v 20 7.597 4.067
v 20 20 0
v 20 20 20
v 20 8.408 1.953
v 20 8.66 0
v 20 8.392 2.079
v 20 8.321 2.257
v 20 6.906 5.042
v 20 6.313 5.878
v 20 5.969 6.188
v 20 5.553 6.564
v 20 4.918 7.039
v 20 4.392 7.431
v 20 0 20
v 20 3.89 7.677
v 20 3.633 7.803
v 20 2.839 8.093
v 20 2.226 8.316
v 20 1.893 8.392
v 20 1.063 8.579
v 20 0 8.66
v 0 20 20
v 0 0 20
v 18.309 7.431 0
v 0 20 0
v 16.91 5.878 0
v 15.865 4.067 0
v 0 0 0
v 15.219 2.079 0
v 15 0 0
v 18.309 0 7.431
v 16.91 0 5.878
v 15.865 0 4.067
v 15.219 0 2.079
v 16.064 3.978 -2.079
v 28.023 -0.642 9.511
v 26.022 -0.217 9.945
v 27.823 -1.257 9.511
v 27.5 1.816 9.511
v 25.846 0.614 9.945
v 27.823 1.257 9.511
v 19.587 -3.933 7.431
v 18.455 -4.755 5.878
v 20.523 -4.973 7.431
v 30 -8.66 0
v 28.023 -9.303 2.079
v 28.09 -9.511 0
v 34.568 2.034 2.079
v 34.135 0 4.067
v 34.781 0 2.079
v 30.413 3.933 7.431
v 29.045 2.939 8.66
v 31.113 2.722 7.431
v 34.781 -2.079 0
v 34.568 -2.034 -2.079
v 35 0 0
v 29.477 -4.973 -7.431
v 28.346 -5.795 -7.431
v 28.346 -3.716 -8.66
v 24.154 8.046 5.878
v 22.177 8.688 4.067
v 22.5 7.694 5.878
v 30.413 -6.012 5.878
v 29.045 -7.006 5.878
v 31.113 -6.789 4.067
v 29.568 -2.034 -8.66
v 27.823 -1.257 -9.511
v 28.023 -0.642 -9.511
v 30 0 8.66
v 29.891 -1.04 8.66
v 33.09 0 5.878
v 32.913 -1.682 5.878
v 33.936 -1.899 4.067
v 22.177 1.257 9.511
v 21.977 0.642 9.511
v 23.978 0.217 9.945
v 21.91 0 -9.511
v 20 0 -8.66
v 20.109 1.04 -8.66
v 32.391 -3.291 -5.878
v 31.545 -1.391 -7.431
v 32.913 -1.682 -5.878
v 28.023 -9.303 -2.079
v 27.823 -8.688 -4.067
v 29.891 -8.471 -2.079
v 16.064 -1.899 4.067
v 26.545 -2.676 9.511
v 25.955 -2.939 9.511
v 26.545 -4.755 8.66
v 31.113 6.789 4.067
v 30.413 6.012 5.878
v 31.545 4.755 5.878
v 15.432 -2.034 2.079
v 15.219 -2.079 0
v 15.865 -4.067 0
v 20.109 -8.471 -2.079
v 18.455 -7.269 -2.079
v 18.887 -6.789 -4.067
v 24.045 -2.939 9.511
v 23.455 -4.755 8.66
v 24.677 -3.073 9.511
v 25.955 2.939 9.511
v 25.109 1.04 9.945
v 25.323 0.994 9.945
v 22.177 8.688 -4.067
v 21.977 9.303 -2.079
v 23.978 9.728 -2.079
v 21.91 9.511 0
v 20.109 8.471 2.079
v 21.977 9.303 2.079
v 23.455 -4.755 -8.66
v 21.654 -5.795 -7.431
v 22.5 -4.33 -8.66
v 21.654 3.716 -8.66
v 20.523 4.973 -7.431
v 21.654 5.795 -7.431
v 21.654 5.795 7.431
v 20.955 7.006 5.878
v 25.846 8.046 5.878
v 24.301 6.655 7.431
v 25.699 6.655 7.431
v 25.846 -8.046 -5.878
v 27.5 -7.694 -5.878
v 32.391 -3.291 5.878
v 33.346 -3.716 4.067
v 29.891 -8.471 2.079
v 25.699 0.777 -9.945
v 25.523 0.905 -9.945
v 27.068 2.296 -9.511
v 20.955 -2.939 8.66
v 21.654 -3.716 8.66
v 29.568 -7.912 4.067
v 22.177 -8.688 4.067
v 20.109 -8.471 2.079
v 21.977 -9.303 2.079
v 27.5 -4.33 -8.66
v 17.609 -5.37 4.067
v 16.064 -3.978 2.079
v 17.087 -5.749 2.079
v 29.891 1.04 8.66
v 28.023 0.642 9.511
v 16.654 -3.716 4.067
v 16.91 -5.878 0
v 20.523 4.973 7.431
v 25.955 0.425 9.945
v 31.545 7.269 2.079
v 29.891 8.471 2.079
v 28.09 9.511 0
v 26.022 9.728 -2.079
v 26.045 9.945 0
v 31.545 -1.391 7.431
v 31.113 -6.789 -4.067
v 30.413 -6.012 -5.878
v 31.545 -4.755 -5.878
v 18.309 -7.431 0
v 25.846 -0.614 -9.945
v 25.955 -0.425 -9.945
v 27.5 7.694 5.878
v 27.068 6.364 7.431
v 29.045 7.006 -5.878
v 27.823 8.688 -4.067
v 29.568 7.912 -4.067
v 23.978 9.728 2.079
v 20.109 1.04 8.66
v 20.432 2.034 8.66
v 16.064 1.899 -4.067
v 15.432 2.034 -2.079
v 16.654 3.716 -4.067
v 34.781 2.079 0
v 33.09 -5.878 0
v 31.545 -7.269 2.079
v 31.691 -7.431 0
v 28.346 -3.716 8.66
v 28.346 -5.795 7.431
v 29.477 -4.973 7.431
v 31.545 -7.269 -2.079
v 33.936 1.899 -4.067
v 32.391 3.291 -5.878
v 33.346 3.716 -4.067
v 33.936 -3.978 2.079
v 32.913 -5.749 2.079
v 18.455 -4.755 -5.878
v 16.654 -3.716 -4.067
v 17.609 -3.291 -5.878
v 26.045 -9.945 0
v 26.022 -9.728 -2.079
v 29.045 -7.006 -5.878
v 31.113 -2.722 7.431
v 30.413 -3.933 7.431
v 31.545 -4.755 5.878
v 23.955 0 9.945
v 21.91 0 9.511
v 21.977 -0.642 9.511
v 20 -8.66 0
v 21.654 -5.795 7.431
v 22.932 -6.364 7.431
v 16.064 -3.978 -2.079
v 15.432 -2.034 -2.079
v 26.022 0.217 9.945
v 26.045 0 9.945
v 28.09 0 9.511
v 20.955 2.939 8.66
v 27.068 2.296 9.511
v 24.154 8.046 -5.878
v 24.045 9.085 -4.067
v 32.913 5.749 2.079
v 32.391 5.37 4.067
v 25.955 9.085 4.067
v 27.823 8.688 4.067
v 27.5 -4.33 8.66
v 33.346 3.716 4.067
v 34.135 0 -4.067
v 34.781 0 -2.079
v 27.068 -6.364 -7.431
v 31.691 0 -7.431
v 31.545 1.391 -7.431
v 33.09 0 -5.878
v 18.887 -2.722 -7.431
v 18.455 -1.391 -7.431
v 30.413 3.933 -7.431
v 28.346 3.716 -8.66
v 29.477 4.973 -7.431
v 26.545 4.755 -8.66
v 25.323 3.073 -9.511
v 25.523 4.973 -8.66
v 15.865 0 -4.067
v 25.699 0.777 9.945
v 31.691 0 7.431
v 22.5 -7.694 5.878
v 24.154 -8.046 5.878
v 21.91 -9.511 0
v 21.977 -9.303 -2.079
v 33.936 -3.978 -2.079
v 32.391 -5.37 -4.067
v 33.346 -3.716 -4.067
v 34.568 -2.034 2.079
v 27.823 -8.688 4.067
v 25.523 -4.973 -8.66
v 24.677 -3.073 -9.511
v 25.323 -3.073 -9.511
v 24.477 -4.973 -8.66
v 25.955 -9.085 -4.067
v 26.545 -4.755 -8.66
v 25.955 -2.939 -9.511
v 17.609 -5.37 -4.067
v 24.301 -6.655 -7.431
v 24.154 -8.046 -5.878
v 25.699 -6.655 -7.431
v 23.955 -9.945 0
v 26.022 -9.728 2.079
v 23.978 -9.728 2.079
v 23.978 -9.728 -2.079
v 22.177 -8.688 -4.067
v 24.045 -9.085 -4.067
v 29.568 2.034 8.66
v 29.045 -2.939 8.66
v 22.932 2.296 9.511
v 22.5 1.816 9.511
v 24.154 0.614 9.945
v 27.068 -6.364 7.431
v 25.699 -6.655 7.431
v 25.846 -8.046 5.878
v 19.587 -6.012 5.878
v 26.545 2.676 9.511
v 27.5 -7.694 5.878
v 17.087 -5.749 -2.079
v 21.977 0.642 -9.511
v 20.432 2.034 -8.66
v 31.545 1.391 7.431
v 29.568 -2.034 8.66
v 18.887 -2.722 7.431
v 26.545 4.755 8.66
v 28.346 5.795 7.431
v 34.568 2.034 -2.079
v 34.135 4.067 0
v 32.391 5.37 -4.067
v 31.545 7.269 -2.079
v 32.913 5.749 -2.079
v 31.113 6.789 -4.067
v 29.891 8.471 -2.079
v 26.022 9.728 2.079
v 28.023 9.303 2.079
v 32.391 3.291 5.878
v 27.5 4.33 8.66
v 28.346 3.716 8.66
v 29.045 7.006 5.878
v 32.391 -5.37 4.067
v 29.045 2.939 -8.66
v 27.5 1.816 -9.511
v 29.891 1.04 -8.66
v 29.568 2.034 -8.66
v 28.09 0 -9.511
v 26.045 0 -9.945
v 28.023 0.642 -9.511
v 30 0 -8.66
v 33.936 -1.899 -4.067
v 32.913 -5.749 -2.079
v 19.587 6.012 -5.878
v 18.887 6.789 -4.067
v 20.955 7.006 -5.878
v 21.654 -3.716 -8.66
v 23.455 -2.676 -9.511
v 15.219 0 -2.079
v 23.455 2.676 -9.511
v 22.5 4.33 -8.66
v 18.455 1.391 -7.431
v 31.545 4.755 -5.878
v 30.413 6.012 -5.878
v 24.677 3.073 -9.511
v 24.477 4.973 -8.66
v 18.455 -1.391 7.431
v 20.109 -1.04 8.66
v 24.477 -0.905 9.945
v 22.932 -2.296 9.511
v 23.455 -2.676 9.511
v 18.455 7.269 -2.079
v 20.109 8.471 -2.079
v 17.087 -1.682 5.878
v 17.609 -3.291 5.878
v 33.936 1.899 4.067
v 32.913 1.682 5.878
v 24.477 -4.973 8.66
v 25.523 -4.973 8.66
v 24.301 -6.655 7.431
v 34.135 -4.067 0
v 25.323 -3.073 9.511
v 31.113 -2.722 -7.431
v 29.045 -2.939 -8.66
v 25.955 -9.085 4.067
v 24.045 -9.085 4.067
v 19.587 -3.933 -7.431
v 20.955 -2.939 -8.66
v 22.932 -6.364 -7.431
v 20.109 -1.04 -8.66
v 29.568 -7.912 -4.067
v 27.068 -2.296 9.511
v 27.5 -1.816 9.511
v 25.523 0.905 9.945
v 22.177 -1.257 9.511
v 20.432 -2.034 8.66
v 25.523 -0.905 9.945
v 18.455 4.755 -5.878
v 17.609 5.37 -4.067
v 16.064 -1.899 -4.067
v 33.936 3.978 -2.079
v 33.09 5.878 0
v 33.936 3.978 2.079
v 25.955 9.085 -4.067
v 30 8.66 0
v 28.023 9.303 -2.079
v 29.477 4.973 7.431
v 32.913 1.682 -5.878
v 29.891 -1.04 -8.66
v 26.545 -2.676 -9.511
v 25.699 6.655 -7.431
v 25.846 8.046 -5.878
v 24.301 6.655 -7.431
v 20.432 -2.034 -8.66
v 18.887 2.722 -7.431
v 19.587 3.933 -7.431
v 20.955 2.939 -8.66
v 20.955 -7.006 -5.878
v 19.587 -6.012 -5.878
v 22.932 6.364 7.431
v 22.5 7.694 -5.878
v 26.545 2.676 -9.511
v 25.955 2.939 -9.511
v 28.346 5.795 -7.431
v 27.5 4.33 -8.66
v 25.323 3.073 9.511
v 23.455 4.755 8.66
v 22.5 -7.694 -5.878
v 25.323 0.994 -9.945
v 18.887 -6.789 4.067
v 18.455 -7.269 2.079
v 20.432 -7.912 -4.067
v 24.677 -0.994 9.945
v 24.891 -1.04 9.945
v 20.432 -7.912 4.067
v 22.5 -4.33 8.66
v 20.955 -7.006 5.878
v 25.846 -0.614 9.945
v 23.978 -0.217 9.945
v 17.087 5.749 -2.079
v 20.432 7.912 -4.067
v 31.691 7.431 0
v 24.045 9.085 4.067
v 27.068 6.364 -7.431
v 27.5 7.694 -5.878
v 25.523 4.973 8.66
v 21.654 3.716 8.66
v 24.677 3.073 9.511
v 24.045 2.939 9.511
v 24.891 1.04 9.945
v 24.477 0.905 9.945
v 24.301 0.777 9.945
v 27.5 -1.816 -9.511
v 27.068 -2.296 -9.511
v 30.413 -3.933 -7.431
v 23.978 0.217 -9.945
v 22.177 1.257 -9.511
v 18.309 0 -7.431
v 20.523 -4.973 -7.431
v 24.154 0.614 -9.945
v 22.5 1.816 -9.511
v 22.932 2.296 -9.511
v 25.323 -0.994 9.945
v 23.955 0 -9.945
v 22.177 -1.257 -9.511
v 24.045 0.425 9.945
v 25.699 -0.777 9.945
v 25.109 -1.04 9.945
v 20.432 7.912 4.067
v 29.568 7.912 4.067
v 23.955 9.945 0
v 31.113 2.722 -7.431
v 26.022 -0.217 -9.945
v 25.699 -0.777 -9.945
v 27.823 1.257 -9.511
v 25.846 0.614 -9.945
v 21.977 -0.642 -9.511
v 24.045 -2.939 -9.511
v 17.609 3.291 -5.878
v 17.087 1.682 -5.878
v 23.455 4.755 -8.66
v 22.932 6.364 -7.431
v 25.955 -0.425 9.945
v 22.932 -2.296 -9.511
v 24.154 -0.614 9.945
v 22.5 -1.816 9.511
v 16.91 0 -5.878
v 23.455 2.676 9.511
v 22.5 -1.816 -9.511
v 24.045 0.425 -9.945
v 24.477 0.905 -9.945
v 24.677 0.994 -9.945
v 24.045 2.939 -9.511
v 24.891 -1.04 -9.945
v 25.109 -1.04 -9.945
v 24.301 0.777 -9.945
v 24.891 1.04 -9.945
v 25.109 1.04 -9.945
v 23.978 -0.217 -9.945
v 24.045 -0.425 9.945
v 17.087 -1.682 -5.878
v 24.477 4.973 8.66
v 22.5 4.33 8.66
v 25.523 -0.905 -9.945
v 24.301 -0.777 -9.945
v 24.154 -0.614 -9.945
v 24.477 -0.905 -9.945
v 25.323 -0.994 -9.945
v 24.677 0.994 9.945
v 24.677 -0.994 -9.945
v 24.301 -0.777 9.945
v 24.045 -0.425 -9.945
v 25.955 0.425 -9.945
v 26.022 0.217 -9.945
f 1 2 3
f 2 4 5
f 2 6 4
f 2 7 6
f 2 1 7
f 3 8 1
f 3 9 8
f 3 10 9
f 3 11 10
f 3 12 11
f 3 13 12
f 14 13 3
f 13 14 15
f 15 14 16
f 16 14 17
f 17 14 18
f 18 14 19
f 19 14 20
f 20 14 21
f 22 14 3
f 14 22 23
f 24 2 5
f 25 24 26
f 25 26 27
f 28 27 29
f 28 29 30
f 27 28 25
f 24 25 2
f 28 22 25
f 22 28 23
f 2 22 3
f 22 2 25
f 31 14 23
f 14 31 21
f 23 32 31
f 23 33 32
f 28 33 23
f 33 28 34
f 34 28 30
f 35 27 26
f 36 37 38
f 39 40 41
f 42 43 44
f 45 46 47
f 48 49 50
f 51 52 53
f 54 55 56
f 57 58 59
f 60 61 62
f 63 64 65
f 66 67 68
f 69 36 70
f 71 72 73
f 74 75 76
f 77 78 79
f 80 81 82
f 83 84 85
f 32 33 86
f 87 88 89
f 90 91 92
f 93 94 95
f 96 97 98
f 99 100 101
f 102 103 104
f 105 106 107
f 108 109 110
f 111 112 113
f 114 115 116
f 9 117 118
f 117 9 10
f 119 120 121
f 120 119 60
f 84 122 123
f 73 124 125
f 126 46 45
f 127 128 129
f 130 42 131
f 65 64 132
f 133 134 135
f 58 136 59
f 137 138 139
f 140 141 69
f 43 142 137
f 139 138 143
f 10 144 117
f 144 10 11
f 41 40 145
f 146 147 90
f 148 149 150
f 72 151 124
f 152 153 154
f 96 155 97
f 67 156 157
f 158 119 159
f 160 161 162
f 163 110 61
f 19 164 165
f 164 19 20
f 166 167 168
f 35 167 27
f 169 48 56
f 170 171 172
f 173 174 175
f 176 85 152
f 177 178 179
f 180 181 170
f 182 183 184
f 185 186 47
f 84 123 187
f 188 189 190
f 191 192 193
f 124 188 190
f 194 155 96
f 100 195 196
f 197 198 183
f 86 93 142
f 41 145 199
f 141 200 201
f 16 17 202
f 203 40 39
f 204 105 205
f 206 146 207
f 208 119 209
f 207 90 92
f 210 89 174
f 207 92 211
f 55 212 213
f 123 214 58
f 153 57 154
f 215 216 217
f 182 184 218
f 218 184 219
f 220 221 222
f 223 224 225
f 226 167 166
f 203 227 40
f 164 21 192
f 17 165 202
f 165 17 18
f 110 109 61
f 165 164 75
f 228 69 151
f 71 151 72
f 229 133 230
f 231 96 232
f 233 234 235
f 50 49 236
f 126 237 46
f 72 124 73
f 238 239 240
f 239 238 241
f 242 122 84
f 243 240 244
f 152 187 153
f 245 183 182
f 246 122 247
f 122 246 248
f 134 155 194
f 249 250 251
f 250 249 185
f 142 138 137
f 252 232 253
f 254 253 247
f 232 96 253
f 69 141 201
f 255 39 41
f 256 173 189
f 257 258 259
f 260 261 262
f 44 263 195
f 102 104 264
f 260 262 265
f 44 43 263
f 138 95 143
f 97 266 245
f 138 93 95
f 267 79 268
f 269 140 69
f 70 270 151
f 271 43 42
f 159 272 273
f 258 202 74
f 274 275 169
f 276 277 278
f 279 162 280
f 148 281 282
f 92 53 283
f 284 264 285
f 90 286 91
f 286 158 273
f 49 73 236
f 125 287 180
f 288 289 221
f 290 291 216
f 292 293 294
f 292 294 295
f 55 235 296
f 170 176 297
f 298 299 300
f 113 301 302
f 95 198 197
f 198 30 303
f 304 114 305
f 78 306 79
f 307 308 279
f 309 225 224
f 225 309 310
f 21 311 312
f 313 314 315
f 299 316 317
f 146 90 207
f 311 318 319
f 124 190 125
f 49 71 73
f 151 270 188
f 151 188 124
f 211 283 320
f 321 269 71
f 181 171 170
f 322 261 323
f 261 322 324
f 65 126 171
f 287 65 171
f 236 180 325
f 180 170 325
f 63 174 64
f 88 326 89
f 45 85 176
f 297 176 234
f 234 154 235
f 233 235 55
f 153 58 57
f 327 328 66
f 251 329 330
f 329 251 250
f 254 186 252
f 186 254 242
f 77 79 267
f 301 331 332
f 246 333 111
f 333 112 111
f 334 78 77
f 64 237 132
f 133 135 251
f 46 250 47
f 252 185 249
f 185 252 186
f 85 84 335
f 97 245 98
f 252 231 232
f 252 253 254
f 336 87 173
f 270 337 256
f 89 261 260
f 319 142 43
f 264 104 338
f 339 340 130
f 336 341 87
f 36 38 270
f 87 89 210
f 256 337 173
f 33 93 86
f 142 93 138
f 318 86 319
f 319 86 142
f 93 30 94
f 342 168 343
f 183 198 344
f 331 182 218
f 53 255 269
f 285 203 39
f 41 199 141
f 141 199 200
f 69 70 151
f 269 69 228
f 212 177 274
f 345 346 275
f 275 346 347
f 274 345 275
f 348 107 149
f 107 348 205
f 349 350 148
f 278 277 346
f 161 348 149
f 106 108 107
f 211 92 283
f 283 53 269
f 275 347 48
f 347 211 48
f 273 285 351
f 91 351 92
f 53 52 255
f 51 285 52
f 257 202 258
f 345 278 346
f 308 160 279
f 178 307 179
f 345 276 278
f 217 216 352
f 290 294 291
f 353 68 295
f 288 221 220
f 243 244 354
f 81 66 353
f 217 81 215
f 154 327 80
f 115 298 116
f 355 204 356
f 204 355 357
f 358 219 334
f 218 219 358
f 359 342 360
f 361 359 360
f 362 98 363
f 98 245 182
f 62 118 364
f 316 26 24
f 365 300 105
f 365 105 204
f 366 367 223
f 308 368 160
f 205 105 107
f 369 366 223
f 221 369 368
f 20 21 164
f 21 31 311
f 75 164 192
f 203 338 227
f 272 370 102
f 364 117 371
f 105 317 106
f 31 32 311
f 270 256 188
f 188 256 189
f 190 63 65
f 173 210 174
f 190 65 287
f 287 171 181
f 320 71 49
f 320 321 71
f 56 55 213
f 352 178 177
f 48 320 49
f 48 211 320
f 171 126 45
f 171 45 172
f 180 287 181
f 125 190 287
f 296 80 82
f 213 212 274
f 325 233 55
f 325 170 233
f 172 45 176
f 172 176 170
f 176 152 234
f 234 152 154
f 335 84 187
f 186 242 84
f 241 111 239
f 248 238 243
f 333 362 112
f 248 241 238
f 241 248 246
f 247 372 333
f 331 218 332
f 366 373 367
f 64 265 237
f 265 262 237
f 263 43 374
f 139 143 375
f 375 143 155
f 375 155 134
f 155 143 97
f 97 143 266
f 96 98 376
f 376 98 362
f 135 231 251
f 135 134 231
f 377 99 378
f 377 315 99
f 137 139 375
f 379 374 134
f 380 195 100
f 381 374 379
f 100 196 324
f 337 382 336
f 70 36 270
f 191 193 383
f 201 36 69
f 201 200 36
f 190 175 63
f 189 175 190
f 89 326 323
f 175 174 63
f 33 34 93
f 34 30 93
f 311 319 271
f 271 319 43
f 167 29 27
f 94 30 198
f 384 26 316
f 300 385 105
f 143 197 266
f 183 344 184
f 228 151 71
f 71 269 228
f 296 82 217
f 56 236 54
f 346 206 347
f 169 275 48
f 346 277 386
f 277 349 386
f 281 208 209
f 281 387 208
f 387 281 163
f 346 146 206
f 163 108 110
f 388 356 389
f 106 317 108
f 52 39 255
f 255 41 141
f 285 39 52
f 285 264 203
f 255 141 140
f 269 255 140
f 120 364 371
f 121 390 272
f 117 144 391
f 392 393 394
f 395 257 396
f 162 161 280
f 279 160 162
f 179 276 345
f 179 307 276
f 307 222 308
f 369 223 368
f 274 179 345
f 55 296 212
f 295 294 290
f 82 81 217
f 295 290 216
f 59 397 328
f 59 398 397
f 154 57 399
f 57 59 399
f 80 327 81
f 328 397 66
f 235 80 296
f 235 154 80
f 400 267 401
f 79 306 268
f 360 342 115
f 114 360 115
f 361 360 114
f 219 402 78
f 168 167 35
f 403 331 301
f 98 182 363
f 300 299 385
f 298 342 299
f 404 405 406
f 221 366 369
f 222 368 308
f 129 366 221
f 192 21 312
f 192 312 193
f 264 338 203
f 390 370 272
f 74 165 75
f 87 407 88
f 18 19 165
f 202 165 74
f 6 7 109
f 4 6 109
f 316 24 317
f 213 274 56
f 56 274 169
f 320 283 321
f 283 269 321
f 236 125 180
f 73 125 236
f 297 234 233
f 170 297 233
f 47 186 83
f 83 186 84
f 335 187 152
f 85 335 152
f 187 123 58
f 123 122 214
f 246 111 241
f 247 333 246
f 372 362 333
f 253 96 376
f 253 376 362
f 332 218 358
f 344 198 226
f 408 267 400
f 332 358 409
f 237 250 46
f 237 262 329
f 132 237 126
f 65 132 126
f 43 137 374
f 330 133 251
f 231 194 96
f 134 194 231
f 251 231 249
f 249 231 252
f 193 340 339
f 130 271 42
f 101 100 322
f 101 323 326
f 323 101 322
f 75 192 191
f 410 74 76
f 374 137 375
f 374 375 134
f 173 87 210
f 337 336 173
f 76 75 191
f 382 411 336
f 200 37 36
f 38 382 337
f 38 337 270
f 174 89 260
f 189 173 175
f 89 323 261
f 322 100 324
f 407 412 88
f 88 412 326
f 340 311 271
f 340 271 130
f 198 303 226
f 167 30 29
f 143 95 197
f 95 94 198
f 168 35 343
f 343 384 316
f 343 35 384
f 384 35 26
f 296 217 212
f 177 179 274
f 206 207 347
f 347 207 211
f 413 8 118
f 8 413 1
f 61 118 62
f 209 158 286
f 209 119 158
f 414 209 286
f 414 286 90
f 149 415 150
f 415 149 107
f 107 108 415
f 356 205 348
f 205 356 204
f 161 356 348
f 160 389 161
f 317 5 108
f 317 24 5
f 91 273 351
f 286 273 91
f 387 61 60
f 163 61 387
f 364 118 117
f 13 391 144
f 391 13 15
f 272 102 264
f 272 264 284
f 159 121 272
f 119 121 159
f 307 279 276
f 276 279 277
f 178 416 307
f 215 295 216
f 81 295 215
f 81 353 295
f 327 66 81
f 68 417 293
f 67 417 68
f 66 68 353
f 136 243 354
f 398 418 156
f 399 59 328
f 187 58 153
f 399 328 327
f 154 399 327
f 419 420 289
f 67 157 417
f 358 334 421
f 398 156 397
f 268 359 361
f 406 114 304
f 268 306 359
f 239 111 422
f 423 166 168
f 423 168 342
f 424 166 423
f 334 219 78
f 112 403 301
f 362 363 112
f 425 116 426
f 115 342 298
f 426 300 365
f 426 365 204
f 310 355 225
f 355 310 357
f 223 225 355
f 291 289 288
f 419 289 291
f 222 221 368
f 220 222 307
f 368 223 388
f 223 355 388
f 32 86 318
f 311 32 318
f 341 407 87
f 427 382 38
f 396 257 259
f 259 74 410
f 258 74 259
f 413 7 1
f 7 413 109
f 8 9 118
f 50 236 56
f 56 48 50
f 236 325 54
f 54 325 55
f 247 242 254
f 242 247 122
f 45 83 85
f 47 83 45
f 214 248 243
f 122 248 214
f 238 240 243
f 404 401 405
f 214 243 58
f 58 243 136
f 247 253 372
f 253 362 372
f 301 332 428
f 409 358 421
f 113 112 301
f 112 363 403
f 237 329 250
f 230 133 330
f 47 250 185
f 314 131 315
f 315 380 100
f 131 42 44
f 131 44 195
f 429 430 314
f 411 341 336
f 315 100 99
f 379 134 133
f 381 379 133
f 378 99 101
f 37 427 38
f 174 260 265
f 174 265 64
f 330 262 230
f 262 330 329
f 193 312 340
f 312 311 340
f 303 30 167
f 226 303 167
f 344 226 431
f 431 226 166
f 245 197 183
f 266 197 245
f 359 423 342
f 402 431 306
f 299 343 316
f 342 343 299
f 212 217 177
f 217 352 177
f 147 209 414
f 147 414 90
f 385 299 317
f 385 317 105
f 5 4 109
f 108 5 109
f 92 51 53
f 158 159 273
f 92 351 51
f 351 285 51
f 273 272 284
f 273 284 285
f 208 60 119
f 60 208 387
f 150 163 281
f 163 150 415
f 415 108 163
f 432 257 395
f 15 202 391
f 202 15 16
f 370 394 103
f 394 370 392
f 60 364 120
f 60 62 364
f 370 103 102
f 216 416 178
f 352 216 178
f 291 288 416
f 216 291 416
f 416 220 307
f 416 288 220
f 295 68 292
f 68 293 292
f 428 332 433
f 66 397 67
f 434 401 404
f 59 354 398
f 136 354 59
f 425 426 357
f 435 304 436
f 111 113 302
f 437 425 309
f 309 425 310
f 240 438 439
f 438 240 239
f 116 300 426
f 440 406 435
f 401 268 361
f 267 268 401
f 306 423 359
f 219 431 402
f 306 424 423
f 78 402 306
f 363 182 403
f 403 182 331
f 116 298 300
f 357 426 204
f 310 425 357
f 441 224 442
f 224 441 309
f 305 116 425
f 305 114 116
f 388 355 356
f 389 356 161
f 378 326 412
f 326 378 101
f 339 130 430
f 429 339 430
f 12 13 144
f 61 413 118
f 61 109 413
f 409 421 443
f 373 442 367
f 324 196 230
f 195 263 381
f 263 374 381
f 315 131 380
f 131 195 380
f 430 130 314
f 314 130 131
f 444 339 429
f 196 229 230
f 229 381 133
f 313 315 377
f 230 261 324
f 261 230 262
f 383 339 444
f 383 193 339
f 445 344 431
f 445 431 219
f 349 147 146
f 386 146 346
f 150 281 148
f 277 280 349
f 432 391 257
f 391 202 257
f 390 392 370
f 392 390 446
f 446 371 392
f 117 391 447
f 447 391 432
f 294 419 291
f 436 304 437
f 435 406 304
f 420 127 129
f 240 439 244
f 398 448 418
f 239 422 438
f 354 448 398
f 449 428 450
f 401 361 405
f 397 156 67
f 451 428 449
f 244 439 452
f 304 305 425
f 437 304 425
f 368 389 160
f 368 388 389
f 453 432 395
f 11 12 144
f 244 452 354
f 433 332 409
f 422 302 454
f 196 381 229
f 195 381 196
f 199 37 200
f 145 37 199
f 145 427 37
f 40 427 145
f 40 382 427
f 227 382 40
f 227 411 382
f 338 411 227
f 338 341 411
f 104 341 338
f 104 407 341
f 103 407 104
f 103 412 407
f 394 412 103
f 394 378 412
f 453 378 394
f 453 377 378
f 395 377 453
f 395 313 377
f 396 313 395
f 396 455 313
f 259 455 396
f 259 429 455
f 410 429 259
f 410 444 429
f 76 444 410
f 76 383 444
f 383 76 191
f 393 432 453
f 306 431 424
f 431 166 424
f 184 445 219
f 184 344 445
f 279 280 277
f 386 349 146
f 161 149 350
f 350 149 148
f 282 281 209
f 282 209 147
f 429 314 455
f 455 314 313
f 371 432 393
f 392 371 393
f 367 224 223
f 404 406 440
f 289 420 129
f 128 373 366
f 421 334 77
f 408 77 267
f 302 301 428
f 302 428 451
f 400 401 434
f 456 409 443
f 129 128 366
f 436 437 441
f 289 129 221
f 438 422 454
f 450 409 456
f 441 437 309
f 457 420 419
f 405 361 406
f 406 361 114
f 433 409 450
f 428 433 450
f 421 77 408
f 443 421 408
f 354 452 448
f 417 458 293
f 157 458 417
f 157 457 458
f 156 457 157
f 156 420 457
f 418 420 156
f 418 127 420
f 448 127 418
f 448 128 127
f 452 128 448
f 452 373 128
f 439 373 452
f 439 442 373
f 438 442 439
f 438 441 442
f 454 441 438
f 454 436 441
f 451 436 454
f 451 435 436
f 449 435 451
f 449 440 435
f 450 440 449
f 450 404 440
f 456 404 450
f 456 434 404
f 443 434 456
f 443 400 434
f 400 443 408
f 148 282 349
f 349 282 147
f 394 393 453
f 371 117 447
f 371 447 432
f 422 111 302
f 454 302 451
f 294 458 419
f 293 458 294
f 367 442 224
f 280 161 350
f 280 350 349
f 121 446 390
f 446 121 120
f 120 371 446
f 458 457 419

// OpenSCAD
// Color and Debug Modifier Parity Test Fixture
// Exercises OpenSCAD color() and # debug-modifier behavior.
// Desktop semantics (from color.cc and the renderer):
//   - color("red") cube()  → renders red in 3D preview
//   - # cube()             → fixed highlight {255,81,81,128}, OVERRIDES color()
//   - SVG export           → fixed stroke="black" fill="lightgray" (no model colors)

/* [Model] */
box_size = 20; // [5:50]

/* [Colors] */
// Generic color param name (NOT "box_color")
model_color = "red"; // [red, green, blue, yellow, white]
accent_color = "#00ff00";

// Normal colored geometry — should render with user-specified color in 3D preview
color(model_color)
    cube([box_size, box_size, box_size]);

// Accent-colored geometry
color(accent_color)
    translate([box_size + 5, 0, 0])
        sphere(r = box_size / 2);

// Debug-modifier geometry — desktop uses FIXED highlight {255,81,81,128}
// and OVERRIDES any user-defined color().
// Uncomment to test:  # color("blue") translate([0, box_size + 5, 0]) cylinder(h=box_size, r=box_size/3);
